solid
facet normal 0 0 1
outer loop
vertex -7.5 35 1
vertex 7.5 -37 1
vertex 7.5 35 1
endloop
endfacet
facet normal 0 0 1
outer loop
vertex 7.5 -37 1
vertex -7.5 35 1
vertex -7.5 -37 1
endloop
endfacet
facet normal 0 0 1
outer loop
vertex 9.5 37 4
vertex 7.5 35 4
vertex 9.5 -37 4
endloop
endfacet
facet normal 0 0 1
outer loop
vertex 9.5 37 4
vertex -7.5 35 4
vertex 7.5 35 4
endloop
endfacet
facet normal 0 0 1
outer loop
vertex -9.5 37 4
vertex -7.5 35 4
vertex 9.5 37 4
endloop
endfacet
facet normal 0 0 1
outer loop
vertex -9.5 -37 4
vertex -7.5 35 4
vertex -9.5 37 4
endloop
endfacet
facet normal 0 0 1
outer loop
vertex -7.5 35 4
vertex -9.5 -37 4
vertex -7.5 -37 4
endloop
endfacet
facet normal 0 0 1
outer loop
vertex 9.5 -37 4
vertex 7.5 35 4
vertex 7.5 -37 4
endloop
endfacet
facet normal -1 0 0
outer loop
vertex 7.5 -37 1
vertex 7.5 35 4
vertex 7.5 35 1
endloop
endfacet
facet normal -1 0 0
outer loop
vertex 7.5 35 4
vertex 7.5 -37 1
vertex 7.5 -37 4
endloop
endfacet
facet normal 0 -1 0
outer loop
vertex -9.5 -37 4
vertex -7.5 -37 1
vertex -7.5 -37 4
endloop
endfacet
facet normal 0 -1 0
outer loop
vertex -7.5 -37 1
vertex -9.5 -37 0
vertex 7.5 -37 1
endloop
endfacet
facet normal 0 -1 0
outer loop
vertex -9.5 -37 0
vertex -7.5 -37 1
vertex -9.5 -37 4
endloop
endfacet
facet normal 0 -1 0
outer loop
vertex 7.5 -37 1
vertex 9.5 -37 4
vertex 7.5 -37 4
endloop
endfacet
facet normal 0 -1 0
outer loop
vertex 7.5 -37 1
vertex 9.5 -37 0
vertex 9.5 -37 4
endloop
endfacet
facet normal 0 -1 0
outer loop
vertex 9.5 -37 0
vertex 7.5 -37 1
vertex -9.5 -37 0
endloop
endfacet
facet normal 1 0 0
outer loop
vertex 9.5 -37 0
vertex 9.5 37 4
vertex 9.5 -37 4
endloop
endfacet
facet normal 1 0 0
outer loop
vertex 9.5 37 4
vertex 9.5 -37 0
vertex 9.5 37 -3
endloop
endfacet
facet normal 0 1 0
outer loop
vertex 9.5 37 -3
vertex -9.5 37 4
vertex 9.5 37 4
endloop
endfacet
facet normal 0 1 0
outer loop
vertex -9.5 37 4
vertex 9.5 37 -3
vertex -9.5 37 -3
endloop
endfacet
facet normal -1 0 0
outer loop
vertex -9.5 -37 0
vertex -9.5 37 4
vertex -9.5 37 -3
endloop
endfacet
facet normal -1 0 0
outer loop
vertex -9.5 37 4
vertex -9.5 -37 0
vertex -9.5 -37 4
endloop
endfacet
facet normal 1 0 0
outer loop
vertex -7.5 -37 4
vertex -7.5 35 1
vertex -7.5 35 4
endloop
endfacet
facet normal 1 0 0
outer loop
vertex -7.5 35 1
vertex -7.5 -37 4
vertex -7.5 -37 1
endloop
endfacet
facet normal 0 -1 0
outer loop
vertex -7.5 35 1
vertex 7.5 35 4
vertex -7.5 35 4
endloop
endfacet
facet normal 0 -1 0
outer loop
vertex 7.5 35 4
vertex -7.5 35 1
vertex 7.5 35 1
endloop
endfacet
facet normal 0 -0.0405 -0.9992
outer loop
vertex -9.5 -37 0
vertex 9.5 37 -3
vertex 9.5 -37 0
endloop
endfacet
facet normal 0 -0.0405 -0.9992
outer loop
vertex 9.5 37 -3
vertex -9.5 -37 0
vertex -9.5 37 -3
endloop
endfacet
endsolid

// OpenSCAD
// Customize here
depth = 15;
width = 70;

screw_plate_enabled = false;

// how thick are edges and base
thickness = 2;
edge_height = 3;

screw_diameter = 7;

// how much should the base be lifted, before additional angle
// (should not be less than thickness)
lift = 1;

// how much additional height should taller end add?
wedge_depth = 3;


// calculated params
outer_depth = depth + thickness*2;
outer_width = width + thickness*2;
base_height = lift;



// offset 43mm @ 1600mm
// additional delta of 3mm @ 800mm


base_width = 1600; // adjacent
offset = 43; // opposite

// opposite/adjacent
slant = atan(offset/base_width);

echo("slant angle", slant);



leg = 3;
ds = (leg-1) * 800;

p1 = ds-width;
p2 = ds;

// tan A = opp/adj
// tan A * adj = opp

p2_offset = tan(slant) * p2;
echo(p2_offset);

p1_offset = tan(slant) * p1;
echo(p1_offset);



















module cylinders(points, diameter, thickness){
    for (p=points){
        translate(p) cylinder(d=diameter, h=thickness, center=true, $fn=100);
    }
}

module flat_plate(points, diameter, thickness, hole_diameter){
    difference(){
        hull() cylinders(points, diameter, thickness);
        cylinders(points, hole_diameter, thickness+1);
    }
}
 /*
module plate(points, diameter, thickness, hole_diameter){
    difference(){
        hull() cylinders(points, diameter, thickness);
        cylinders(points, hole_diameter, thickness+1);
    }
}*/

module plate(width, depth, thickness, corner_radius){
    r = corner_radius;
    points = [[0+r,0+r], [0+r,width-r], [depth-r, width-r], [depth-r,0+r]];
    hull() cylinders(points, corner_radius*2, thickness);
}
 
module bar(length, width, thickness, hole_diameter){
    plate([[0,0,0], [length,0,0]], width, thickness, hole_diameter);
}


/*color("Wheat") difference() {
    translate([0,0,base_height]) linear_extrude(height=300,convexity=10) square([depth, width], true);
        
        // 1st hole
        translate([0,17.25,base_height+25])
              rotate([0,90,0]) cylinder(outer_depth, screw_diameter/2, screw_diameter/2, true,$fn=100);
        translate([0,-17.25,base_height+25])
              rotate([0,90,0]) cylinder(outer_depth, screw_diameter/2, screw_diameter/2, true,$fn=100);
    
    
        // 2nd hole
        translate([0,17.25,base_height+25+150])
              rotate([0,90,0]) cylinder(outer_depth, screw_diameter/2, screw_diameter/2, true,$fn=100);
        translate([0,-17.25,base_height+25+150])
              rotate([0,90,0]) cylinder(outer_depth, screw_diameter/2, screw_diameter/2, true,$fn=100);
    }
  */  


// the center point from the edge of the wood (vertically) of the first hole
hole_vertical_centre_start = 25;

padding = 7;
th = hole_vertical_centre_start-edge_height+screw_diameter/2+padding;
    
td = hole_vertical_centre_start+screw_diameter/2+padding;
    
hole_offset = 17.25;
holegap = hole_offset*2;
hw = holegap+screw_diameter+padding*2;

color([1,0,0,0.5])  {
    union() {
        difference() {
            
            union() {
                // base
                translate([0,0,base_height]) linear_extrude(height=edge_height,convexity=10){
                    difference() {
                        square([outer_depth, outer_width], true);
                        square([depth, width], true);
                        translate([0,outer_width/2*-1,0]) square([depth, width], true);
                    }
                }

                // flat base
                linear_extrude(height=base_height){
                    square([outer_depth, outer_width], true);
                }

                // wedge
                triangle_points = [[0,0],[0,outer_width],[wedge_depth,outer_width]];
                triangle_paths = [[0,1,2]];
                translate([outer_depth/2*-1,outer_width/2*-1,0]) rotate([0,90,0]) linear_extrude(height=outer_depth) {
                    polygon(triangle_points,triangle_paths,10);
                }
        
                
                // back screw plate
                if (screw_plate_enabled) {
                    echo("screw plate added:", screw_plate_enabled);
                    translate([depth/2+thickness/2,hw/2*-1,base_height]) rotate([0,270,0]) plate(hw, td, thickness, 3);
                }
                
            }
            
            // cut out screw holes
            translate([outer_depth/2,hole_offset,base_height+25])
              rotate([0,90,0]) cylinder(outer_depth, screw_diameter/2+0.5, screw_diameter/2+1, true,$fn=100);
            translate([outer_depth/2,hole_offset*-1,base_height+25])
              rotate([0,90,0]) cylinder(outer_depth, screw_diameter/2+0.5, screw_diameter/2+1, true,$fn=100);
            
        }
        
        
        
        
    }
}




/*color([1,0,0,0.5]) translate([0,0,base_height+edge_height]) linear_extrude(height=th){
            translate([depth/2+thickness/2,0,0]) square([thickness, hw], true);
        }*/
